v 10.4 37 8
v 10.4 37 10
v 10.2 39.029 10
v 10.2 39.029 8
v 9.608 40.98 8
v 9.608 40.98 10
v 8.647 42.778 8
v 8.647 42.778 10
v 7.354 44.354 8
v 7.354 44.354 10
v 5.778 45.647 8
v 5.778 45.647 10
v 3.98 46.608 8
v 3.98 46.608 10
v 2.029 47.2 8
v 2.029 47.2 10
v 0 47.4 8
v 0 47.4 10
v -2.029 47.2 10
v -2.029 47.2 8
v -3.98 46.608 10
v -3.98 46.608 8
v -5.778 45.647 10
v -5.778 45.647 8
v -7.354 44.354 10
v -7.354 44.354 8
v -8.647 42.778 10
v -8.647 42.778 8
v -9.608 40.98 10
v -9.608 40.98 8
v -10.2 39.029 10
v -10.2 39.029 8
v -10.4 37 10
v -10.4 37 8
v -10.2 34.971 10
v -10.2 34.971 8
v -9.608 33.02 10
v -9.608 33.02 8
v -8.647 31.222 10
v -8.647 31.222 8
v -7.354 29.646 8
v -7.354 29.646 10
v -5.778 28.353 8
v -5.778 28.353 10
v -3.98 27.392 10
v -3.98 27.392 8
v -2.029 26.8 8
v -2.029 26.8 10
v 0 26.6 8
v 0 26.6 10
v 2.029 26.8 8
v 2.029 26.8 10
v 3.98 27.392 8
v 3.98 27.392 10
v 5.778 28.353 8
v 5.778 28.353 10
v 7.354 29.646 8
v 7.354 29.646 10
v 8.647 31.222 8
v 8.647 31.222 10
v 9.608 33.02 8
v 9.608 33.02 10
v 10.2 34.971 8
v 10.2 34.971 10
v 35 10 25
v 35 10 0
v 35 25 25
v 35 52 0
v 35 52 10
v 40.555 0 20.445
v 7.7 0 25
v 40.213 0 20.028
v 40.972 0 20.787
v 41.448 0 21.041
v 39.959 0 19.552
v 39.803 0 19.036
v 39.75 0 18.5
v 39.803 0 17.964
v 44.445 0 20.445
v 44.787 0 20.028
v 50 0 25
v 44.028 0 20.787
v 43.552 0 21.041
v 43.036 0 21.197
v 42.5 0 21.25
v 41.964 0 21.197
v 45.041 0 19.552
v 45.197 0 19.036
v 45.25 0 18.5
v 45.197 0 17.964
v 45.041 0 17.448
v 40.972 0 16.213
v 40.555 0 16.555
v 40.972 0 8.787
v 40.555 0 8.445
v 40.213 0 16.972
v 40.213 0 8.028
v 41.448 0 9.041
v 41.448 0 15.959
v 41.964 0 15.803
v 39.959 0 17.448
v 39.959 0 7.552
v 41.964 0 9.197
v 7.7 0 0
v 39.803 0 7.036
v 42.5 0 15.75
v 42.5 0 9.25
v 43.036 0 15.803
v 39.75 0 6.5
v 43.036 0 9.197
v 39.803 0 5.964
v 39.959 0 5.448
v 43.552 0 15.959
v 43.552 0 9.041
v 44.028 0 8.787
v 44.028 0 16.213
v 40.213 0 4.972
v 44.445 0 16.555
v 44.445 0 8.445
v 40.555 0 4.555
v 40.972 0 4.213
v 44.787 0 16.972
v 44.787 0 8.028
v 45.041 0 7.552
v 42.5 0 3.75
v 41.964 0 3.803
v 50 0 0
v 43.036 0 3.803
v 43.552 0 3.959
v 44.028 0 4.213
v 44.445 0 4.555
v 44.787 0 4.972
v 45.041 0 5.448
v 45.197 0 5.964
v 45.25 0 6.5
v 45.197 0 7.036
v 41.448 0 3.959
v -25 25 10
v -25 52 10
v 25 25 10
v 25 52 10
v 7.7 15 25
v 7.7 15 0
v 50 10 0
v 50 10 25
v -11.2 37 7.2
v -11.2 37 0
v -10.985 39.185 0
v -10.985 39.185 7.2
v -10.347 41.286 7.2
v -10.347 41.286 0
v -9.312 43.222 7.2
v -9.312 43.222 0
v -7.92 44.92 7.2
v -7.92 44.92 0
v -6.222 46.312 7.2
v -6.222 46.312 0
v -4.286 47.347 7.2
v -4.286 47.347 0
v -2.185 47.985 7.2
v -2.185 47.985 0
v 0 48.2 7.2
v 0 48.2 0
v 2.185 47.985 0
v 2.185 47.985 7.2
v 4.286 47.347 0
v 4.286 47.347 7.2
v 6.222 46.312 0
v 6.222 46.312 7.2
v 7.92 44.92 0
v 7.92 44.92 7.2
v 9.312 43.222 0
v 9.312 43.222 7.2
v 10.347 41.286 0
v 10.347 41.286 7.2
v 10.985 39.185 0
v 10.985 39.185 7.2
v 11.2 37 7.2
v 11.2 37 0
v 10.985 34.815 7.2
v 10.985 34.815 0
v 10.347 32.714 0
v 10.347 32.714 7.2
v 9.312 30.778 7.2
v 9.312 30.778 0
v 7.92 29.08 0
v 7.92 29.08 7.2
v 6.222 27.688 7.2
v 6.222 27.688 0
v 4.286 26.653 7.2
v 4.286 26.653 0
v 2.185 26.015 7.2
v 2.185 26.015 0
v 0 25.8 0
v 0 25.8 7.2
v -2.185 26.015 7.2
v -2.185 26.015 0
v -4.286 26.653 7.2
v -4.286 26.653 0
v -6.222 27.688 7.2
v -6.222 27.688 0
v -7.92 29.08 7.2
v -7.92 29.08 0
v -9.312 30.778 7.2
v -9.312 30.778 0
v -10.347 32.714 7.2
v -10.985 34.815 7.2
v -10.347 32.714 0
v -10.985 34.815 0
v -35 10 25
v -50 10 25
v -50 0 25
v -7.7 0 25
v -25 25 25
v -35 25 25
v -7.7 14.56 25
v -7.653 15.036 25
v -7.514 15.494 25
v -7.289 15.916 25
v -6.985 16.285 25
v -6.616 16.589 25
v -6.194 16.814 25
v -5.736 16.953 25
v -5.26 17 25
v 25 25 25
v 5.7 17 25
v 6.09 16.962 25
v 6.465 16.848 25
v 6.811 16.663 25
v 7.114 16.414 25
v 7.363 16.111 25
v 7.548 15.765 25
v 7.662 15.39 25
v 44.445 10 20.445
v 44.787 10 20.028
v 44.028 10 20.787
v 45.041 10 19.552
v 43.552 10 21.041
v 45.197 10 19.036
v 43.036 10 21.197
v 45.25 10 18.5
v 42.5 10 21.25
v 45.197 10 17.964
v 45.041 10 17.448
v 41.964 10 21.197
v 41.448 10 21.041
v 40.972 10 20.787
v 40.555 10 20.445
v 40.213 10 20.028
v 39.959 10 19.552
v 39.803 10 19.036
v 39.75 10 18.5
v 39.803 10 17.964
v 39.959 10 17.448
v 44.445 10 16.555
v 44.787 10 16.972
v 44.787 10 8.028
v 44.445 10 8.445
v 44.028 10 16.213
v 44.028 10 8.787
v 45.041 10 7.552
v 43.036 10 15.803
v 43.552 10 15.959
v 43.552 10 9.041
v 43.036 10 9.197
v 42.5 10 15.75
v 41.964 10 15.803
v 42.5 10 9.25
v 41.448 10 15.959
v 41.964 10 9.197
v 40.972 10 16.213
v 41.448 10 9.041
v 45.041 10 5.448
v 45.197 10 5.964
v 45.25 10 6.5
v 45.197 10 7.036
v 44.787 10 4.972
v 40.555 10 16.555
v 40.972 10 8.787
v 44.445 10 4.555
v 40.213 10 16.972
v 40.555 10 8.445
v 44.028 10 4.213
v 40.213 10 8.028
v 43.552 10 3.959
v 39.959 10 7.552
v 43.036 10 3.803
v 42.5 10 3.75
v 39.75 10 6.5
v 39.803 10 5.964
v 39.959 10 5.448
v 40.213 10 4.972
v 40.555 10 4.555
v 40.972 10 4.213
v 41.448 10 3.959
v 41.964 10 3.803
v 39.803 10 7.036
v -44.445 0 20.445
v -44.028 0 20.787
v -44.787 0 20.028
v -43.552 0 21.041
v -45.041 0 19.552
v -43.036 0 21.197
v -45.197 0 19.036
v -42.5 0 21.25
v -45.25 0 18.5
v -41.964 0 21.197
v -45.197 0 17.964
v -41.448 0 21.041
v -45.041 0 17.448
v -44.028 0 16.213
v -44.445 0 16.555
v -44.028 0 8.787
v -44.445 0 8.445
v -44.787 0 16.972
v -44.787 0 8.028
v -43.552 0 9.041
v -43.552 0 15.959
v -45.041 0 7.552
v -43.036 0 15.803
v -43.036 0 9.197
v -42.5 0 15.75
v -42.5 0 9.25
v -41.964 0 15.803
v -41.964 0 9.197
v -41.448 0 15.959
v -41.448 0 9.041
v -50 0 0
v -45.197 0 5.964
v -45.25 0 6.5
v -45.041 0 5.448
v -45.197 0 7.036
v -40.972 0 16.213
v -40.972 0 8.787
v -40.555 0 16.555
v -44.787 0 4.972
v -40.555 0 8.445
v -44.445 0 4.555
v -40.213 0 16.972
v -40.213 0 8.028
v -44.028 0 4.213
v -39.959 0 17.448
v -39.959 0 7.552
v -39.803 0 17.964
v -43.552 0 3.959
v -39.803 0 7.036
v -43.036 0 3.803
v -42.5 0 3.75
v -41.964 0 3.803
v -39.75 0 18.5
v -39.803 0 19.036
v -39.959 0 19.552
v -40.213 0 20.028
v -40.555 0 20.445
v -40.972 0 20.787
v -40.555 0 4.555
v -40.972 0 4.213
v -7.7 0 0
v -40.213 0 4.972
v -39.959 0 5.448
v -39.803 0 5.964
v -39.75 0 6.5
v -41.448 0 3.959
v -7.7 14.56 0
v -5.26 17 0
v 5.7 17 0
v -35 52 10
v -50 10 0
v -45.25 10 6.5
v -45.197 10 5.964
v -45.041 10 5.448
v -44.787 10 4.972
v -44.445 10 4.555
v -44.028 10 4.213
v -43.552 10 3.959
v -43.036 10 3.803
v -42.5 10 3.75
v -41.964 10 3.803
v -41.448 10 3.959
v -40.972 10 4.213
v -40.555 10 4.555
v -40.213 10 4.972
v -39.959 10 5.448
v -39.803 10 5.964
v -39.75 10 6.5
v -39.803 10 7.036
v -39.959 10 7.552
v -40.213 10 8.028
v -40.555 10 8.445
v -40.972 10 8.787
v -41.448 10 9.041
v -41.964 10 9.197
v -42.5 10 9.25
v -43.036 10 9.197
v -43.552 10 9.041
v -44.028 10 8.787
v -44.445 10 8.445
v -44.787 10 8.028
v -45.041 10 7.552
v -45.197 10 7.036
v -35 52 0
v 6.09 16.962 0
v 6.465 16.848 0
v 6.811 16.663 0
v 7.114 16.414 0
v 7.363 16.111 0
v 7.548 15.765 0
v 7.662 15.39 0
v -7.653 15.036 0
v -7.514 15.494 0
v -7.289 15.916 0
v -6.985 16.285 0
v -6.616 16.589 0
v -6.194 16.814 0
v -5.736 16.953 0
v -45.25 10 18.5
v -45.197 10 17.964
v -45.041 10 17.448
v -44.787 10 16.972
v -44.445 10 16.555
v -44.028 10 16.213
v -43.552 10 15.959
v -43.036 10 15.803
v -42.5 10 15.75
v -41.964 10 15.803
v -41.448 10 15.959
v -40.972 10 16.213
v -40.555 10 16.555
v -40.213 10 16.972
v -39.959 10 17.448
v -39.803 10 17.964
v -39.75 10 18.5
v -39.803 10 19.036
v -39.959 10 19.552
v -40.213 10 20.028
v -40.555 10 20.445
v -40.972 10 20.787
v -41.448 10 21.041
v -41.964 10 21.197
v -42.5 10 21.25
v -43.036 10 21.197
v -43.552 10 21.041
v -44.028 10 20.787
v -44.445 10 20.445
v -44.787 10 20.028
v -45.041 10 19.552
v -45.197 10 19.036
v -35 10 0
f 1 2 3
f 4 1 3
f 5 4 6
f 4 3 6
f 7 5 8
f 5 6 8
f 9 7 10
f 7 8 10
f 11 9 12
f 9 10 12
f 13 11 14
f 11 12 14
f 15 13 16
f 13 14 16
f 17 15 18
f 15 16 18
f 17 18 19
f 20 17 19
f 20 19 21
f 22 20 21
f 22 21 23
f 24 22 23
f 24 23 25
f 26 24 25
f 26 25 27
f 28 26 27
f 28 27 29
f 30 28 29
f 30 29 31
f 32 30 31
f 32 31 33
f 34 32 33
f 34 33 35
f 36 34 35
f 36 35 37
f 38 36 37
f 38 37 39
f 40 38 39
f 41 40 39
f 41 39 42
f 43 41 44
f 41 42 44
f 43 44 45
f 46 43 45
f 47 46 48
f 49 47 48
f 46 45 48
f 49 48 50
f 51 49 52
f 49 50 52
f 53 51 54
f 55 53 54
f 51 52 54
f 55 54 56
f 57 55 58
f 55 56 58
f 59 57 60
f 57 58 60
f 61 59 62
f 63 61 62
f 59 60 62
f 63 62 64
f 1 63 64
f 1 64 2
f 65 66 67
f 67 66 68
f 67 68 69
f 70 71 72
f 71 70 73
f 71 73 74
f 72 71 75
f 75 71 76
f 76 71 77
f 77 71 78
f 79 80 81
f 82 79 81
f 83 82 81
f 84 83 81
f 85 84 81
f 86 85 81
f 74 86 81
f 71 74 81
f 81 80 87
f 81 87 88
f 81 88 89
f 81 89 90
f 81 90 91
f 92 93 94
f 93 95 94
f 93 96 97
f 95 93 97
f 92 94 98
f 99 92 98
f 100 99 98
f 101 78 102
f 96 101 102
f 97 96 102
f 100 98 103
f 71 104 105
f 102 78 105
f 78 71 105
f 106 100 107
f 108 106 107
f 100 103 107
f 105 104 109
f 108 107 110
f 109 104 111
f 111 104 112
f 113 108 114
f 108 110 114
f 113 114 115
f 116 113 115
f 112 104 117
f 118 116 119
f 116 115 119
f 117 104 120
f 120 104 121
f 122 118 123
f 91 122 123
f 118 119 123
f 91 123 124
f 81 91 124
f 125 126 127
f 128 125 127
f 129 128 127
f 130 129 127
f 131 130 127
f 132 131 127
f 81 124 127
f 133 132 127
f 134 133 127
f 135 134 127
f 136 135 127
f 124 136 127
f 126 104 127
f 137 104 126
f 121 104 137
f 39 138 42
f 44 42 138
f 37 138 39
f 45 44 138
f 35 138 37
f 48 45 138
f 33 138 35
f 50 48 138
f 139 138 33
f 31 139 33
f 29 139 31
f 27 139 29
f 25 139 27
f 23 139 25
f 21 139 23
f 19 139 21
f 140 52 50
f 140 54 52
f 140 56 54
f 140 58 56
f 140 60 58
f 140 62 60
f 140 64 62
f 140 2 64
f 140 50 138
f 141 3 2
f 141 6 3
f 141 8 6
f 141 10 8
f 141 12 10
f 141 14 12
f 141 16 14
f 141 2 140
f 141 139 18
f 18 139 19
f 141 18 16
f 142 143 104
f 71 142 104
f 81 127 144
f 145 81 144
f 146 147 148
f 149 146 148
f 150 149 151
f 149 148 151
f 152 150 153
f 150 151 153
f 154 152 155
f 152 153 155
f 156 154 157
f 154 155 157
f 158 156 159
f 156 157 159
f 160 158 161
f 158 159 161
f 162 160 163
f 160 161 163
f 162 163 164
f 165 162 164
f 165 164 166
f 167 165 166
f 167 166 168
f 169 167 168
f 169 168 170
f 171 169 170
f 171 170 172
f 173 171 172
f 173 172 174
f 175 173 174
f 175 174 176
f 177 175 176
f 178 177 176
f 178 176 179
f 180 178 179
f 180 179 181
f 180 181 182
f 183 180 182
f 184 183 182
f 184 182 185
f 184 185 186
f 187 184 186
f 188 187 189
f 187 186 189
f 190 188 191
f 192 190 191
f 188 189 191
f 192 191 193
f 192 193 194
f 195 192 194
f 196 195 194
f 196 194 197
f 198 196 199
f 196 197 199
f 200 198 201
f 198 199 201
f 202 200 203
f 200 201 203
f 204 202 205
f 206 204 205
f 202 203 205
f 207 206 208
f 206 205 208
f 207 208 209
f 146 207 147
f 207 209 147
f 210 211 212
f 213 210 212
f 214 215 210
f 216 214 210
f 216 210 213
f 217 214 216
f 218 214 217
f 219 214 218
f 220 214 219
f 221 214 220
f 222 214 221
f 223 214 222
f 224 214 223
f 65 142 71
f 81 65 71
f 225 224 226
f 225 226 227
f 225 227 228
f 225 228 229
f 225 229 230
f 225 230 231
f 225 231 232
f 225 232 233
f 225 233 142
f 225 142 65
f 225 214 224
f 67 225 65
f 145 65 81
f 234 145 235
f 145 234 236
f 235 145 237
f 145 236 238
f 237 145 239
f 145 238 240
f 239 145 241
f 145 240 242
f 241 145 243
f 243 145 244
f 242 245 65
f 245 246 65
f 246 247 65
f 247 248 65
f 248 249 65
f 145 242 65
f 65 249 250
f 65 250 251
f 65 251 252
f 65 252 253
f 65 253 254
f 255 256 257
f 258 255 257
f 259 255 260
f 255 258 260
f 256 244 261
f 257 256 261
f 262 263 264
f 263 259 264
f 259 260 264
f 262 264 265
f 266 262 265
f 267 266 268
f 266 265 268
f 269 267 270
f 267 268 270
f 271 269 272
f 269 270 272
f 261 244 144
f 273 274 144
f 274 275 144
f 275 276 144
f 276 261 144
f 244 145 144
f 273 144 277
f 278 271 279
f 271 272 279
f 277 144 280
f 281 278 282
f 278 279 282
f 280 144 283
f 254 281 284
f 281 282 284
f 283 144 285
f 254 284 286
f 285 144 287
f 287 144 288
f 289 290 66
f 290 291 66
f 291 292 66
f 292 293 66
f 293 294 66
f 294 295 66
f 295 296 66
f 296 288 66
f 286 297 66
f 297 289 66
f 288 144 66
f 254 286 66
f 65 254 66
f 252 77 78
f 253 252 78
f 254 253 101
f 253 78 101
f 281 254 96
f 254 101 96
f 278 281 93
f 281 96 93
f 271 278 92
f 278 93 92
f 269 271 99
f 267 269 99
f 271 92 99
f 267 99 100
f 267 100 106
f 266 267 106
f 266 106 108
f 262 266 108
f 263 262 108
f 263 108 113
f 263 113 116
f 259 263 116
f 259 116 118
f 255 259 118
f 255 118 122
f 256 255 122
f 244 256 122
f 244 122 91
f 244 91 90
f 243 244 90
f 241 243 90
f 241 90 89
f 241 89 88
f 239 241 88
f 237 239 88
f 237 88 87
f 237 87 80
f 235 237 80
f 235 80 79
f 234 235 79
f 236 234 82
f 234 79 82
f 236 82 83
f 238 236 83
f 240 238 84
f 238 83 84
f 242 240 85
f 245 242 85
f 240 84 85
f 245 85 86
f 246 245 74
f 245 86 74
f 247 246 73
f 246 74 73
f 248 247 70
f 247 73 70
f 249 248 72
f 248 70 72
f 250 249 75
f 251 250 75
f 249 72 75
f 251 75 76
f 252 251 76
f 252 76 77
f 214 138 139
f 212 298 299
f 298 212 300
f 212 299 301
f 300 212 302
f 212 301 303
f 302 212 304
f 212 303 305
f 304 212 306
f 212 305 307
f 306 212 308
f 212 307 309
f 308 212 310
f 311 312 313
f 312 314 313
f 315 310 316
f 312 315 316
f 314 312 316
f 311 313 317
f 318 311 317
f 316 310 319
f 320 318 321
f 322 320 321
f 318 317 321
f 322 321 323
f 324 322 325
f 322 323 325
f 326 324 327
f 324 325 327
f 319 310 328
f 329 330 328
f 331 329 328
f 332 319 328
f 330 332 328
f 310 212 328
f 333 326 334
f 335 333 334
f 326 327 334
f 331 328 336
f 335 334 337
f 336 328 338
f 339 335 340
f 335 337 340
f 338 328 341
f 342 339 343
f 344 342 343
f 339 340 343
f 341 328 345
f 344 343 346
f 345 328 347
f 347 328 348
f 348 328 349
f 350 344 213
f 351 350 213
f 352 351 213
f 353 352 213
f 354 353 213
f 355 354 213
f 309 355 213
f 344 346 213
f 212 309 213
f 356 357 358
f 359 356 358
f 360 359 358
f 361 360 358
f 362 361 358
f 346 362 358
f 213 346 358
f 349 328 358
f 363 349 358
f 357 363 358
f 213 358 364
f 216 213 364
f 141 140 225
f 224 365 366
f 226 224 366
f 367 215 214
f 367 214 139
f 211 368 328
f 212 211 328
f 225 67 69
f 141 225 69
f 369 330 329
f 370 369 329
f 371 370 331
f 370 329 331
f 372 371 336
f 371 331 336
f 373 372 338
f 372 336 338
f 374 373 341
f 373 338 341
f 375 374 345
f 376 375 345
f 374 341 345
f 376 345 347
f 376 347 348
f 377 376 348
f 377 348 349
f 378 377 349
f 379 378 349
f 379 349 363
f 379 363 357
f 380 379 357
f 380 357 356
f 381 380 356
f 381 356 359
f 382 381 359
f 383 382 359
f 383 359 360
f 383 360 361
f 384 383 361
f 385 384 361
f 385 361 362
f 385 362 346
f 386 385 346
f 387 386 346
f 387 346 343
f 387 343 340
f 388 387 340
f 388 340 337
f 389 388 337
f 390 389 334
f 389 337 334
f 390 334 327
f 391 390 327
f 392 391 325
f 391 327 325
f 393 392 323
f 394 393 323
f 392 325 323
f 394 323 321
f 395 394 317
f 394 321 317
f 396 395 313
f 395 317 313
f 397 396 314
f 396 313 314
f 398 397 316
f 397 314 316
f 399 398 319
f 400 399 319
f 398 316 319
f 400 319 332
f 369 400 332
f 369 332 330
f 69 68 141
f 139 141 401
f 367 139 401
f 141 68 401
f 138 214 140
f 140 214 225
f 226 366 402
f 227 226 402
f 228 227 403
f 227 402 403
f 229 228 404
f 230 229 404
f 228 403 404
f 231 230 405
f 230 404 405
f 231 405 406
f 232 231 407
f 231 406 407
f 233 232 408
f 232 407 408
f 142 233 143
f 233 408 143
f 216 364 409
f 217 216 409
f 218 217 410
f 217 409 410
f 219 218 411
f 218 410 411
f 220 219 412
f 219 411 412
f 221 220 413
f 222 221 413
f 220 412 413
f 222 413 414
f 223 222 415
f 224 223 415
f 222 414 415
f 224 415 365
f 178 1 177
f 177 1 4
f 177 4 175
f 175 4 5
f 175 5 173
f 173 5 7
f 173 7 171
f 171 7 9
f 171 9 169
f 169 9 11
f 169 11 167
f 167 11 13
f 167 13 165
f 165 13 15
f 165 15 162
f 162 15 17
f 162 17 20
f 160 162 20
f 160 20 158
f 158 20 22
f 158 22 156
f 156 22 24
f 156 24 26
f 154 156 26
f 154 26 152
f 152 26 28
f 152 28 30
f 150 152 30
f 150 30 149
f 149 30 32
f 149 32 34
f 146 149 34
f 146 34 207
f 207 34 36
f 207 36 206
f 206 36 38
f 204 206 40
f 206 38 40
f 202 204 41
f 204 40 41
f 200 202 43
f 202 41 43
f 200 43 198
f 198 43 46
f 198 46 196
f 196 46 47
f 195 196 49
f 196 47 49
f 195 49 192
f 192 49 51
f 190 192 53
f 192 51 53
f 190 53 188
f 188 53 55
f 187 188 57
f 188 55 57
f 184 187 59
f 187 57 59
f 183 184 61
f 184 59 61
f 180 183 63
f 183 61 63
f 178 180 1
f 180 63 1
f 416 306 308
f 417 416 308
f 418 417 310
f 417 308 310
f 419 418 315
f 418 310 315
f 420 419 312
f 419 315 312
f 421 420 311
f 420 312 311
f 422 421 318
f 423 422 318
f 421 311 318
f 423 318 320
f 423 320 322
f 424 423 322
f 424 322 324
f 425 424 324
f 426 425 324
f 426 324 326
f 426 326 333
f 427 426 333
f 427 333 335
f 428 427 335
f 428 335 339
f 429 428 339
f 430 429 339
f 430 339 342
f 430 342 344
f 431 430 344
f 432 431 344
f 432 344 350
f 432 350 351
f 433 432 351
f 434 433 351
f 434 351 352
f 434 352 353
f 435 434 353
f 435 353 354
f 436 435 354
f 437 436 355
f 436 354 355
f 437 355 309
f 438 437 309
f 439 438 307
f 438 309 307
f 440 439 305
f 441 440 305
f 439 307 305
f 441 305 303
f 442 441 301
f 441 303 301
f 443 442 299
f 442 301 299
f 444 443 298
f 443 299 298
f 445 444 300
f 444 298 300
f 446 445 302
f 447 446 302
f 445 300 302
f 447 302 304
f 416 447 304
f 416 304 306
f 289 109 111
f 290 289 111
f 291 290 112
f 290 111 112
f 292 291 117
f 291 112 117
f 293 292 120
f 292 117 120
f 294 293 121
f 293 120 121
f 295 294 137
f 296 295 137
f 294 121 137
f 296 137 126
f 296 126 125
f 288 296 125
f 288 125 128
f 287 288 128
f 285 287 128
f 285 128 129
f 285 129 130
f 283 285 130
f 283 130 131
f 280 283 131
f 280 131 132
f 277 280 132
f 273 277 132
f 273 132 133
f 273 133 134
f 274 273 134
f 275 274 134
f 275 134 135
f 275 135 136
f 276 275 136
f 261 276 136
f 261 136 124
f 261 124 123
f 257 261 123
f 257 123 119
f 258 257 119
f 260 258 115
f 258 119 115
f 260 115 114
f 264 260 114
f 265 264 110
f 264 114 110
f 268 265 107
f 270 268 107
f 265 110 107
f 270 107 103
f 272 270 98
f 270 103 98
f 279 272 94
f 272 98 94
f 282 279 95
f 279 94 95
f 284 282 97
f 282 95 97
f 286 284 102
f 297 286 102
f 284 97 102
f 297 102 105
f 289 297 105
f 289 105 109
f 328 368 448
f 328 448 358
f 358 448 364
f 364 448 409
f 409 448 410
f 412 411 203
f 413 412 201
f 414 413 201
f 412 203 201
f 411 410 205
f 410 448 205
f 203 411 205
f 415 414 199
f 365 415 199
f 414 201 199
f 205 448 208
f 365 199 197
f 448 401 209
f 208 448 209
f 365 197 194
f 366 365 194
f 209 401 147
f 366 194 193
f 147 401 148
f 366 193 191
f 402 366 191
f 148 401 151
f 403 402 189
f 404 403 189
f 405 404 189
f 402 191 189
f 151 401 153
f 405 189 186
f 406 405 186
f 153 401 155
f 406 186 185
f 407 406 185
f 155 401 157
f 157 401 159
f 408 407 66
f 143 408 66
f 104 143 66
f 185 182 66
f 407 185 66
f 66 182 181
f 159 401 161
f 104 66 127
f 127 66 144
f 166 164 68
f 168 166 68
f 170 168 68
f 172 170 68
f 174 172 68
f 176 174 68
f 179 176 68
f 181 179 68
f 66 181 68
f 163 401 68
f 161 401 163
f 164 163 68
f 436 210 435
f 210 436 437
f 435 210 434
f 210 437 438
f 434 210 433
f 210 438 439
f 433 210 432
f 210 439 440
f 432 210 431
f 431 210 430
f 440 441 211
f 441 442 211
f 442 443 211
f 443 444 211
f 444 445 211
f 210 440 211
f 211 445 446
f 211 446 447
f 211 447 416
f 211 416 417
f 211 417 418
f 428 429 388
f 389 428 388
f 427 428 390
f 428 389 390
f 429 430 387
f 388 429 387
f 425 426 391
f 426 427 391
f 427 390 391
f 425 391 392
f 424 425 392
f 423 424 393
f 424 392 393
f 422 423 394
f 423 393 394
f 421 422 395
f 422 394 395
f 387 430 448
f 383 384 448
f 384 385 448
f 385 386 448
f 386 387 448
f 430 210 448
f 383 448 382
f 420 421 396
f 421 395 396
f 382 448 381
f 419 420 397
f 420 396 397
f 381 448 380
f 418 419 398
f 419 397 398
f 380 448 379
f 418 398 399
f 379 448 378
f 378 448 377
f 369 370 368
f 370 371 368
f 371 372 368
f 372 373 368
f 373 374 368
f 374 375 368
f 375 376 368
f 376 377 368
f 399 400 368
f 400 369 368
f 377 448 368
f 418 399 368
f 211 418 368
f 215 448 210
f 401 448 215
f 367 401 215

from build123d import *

# Parameters (mm, degrees)
BOSS_EXTRUDE1_DEPTH  = 25
SKETCH2_R            = 11.2
CUT_EXTRUDE1_DEPTH   = 77.347887987
SKETCH11_W           = 90
SKETCH11_H           = 30
CUT_EXTRUDE4_DEPTH   = 15
BOSS_EXTRUDE2_DEPTH  = 10
BOSS_EXTRUDE3_DEPTH  = 10
SKETCH14_R           = 11.4
SKETCH14_R_2         = 10.4
BOSS_EXTRUDE4_DEPTH  = 3
CHAMFER1_SIZE        = 1
M5_CLEARANCE_HOLE1_D = 5.5


with BuildPart() as part:
    # Sketch1 → Boss-Extrude1 (new body)
    with BuildSketch(Plane.XY):
        with BuildLine():
            Line((50, 0), (50, 10))
            Line((50, 10), (35, 10))
            Line((35, 10), (35, 52))
            Line((35, 52), (-35, 52))
            Line((-35, 52), (-35, 10))
            Line((-35, 10), (-50, 10))
            Line((-50, 10), (-50, 0))
            Line((-50, 0), (-7.7, 0))
            Line((-7.7, 0), (-7.7, 14.560093328))
            ThreePointArc((-7.7, 14.560093328), (-6.985367881, 16.285367881), (-5.260093328, 17))
            Line((-5.260093328, 17), (5.7, 17))
            ThreePointArc((5.7, 17), (7.114213562, 16.414213562), (7.7, 15))
            Line((7.7, 15), (7.7, 0))
            Line((7.7, 0), (50, 0))
        make_face()
    extrude(amount=BOSS_EXTRUDE1_DEPTH)

    # Sketch2 → Cut-Extrude1 (cut, through all)
    with BuildSketch(Plane(origin=(0, 0, 0), x_dir=(-1, 0, 0), z_dir=(0, 0, -1))):
        with Locations((0, 37)):
            Circle(SKETCH2_R)
    extrude(amount=-CUT_EXTRUDE1_DEPTH, mode=Mode.SUBTRACT)

    # Sketch11 → Cut-Extrude4 (cut)
    with BuildSketch(Plane.XY.offset(25)):
        with Locations((0, 40)):
            Rectangle(SKETCH11_W, SKETCH11_H)
    extrude(amount=-CUT_EXTRUDE4_DEPTH, mode=Mode.SUBTRACT)

    # Sketch12 → Boss-Extrude2 (add)
    with BuildSketch(Plane.ZY.offset(35)):
        Polygon((10, 52), (10, 25), (25, 25), align=None)
    extrude(amount=-BOSS_EXTRUDE2_DEPTH)

    # Sketch13 → Boss-Extrude3 (add)
    with BuildSketch(Plane(origin=(35, 0, 0), x_dir=(0, 0, -1), z_dir=(1, 0, 0))):
        Polygon((-10, 52), (-10, 25), (-25, 25), align=None)
    extrude(amount=-BOSS_EXTRUDE3_DEPTH)

    # Sketch14 → Boss-Extrude4 (add)
    with BuildSketch(Plane.XY.offset(10)):
        with Locations((0, 37)):
            Circle(SKETCH14_R)
        with Locations((0, 37)):
            Circle(SKETCH14_R_2, mode=Mode.SUBTRACT)
    extrude(amount=-BOSS_EXTRUDE4_DEPTH)

    # Chamfer1
    # the kernel refuses this chamfer: 1 mm, written as the material it takes off along each edge
    with BuildSketch(Plane(origin=(0, 37, 7), x_dir=(1, 0, 0), z_dir=(0, -1, 0))) as chamfer1_piece_1_section:
        Polygon((10.4 + CHAMFER1_SIZE, 0), (10.4, CHAMFER1_SIZE), (10.4, 0), align=None)
    chamfer1_piece_1 = revolve(axis=Axis((0, 37, 7), (0, 0, 1)), mode=Mode.PRIVATE)
    chamfer1_piece_1 = chamfer1_piece_1 & Plane(origin=(0, 37, 7.590998704), x_dir=(-1, 0, 0), z_dir=(0, 0, -1)) * Cylinder(11.2, 46, mode=Mode.PRIVATE)
    add(chamfer1_piece_1, mode=Mode.SUBTRACT)

    # M5 Clearance Hole1 (through all)
    with Locations(Plane(origin=(0, 10, 0), x_dir=(1, 0, 0), z_dir=(0, 1, 0))):
        with Locations((42.5, -18.5), (42.5, -6.5), (-42.5, -18.5), (-42.5, -6.5)):
            Hole(M5_CLEARANCE_HOLE1_D / 2)


solid = part.part
